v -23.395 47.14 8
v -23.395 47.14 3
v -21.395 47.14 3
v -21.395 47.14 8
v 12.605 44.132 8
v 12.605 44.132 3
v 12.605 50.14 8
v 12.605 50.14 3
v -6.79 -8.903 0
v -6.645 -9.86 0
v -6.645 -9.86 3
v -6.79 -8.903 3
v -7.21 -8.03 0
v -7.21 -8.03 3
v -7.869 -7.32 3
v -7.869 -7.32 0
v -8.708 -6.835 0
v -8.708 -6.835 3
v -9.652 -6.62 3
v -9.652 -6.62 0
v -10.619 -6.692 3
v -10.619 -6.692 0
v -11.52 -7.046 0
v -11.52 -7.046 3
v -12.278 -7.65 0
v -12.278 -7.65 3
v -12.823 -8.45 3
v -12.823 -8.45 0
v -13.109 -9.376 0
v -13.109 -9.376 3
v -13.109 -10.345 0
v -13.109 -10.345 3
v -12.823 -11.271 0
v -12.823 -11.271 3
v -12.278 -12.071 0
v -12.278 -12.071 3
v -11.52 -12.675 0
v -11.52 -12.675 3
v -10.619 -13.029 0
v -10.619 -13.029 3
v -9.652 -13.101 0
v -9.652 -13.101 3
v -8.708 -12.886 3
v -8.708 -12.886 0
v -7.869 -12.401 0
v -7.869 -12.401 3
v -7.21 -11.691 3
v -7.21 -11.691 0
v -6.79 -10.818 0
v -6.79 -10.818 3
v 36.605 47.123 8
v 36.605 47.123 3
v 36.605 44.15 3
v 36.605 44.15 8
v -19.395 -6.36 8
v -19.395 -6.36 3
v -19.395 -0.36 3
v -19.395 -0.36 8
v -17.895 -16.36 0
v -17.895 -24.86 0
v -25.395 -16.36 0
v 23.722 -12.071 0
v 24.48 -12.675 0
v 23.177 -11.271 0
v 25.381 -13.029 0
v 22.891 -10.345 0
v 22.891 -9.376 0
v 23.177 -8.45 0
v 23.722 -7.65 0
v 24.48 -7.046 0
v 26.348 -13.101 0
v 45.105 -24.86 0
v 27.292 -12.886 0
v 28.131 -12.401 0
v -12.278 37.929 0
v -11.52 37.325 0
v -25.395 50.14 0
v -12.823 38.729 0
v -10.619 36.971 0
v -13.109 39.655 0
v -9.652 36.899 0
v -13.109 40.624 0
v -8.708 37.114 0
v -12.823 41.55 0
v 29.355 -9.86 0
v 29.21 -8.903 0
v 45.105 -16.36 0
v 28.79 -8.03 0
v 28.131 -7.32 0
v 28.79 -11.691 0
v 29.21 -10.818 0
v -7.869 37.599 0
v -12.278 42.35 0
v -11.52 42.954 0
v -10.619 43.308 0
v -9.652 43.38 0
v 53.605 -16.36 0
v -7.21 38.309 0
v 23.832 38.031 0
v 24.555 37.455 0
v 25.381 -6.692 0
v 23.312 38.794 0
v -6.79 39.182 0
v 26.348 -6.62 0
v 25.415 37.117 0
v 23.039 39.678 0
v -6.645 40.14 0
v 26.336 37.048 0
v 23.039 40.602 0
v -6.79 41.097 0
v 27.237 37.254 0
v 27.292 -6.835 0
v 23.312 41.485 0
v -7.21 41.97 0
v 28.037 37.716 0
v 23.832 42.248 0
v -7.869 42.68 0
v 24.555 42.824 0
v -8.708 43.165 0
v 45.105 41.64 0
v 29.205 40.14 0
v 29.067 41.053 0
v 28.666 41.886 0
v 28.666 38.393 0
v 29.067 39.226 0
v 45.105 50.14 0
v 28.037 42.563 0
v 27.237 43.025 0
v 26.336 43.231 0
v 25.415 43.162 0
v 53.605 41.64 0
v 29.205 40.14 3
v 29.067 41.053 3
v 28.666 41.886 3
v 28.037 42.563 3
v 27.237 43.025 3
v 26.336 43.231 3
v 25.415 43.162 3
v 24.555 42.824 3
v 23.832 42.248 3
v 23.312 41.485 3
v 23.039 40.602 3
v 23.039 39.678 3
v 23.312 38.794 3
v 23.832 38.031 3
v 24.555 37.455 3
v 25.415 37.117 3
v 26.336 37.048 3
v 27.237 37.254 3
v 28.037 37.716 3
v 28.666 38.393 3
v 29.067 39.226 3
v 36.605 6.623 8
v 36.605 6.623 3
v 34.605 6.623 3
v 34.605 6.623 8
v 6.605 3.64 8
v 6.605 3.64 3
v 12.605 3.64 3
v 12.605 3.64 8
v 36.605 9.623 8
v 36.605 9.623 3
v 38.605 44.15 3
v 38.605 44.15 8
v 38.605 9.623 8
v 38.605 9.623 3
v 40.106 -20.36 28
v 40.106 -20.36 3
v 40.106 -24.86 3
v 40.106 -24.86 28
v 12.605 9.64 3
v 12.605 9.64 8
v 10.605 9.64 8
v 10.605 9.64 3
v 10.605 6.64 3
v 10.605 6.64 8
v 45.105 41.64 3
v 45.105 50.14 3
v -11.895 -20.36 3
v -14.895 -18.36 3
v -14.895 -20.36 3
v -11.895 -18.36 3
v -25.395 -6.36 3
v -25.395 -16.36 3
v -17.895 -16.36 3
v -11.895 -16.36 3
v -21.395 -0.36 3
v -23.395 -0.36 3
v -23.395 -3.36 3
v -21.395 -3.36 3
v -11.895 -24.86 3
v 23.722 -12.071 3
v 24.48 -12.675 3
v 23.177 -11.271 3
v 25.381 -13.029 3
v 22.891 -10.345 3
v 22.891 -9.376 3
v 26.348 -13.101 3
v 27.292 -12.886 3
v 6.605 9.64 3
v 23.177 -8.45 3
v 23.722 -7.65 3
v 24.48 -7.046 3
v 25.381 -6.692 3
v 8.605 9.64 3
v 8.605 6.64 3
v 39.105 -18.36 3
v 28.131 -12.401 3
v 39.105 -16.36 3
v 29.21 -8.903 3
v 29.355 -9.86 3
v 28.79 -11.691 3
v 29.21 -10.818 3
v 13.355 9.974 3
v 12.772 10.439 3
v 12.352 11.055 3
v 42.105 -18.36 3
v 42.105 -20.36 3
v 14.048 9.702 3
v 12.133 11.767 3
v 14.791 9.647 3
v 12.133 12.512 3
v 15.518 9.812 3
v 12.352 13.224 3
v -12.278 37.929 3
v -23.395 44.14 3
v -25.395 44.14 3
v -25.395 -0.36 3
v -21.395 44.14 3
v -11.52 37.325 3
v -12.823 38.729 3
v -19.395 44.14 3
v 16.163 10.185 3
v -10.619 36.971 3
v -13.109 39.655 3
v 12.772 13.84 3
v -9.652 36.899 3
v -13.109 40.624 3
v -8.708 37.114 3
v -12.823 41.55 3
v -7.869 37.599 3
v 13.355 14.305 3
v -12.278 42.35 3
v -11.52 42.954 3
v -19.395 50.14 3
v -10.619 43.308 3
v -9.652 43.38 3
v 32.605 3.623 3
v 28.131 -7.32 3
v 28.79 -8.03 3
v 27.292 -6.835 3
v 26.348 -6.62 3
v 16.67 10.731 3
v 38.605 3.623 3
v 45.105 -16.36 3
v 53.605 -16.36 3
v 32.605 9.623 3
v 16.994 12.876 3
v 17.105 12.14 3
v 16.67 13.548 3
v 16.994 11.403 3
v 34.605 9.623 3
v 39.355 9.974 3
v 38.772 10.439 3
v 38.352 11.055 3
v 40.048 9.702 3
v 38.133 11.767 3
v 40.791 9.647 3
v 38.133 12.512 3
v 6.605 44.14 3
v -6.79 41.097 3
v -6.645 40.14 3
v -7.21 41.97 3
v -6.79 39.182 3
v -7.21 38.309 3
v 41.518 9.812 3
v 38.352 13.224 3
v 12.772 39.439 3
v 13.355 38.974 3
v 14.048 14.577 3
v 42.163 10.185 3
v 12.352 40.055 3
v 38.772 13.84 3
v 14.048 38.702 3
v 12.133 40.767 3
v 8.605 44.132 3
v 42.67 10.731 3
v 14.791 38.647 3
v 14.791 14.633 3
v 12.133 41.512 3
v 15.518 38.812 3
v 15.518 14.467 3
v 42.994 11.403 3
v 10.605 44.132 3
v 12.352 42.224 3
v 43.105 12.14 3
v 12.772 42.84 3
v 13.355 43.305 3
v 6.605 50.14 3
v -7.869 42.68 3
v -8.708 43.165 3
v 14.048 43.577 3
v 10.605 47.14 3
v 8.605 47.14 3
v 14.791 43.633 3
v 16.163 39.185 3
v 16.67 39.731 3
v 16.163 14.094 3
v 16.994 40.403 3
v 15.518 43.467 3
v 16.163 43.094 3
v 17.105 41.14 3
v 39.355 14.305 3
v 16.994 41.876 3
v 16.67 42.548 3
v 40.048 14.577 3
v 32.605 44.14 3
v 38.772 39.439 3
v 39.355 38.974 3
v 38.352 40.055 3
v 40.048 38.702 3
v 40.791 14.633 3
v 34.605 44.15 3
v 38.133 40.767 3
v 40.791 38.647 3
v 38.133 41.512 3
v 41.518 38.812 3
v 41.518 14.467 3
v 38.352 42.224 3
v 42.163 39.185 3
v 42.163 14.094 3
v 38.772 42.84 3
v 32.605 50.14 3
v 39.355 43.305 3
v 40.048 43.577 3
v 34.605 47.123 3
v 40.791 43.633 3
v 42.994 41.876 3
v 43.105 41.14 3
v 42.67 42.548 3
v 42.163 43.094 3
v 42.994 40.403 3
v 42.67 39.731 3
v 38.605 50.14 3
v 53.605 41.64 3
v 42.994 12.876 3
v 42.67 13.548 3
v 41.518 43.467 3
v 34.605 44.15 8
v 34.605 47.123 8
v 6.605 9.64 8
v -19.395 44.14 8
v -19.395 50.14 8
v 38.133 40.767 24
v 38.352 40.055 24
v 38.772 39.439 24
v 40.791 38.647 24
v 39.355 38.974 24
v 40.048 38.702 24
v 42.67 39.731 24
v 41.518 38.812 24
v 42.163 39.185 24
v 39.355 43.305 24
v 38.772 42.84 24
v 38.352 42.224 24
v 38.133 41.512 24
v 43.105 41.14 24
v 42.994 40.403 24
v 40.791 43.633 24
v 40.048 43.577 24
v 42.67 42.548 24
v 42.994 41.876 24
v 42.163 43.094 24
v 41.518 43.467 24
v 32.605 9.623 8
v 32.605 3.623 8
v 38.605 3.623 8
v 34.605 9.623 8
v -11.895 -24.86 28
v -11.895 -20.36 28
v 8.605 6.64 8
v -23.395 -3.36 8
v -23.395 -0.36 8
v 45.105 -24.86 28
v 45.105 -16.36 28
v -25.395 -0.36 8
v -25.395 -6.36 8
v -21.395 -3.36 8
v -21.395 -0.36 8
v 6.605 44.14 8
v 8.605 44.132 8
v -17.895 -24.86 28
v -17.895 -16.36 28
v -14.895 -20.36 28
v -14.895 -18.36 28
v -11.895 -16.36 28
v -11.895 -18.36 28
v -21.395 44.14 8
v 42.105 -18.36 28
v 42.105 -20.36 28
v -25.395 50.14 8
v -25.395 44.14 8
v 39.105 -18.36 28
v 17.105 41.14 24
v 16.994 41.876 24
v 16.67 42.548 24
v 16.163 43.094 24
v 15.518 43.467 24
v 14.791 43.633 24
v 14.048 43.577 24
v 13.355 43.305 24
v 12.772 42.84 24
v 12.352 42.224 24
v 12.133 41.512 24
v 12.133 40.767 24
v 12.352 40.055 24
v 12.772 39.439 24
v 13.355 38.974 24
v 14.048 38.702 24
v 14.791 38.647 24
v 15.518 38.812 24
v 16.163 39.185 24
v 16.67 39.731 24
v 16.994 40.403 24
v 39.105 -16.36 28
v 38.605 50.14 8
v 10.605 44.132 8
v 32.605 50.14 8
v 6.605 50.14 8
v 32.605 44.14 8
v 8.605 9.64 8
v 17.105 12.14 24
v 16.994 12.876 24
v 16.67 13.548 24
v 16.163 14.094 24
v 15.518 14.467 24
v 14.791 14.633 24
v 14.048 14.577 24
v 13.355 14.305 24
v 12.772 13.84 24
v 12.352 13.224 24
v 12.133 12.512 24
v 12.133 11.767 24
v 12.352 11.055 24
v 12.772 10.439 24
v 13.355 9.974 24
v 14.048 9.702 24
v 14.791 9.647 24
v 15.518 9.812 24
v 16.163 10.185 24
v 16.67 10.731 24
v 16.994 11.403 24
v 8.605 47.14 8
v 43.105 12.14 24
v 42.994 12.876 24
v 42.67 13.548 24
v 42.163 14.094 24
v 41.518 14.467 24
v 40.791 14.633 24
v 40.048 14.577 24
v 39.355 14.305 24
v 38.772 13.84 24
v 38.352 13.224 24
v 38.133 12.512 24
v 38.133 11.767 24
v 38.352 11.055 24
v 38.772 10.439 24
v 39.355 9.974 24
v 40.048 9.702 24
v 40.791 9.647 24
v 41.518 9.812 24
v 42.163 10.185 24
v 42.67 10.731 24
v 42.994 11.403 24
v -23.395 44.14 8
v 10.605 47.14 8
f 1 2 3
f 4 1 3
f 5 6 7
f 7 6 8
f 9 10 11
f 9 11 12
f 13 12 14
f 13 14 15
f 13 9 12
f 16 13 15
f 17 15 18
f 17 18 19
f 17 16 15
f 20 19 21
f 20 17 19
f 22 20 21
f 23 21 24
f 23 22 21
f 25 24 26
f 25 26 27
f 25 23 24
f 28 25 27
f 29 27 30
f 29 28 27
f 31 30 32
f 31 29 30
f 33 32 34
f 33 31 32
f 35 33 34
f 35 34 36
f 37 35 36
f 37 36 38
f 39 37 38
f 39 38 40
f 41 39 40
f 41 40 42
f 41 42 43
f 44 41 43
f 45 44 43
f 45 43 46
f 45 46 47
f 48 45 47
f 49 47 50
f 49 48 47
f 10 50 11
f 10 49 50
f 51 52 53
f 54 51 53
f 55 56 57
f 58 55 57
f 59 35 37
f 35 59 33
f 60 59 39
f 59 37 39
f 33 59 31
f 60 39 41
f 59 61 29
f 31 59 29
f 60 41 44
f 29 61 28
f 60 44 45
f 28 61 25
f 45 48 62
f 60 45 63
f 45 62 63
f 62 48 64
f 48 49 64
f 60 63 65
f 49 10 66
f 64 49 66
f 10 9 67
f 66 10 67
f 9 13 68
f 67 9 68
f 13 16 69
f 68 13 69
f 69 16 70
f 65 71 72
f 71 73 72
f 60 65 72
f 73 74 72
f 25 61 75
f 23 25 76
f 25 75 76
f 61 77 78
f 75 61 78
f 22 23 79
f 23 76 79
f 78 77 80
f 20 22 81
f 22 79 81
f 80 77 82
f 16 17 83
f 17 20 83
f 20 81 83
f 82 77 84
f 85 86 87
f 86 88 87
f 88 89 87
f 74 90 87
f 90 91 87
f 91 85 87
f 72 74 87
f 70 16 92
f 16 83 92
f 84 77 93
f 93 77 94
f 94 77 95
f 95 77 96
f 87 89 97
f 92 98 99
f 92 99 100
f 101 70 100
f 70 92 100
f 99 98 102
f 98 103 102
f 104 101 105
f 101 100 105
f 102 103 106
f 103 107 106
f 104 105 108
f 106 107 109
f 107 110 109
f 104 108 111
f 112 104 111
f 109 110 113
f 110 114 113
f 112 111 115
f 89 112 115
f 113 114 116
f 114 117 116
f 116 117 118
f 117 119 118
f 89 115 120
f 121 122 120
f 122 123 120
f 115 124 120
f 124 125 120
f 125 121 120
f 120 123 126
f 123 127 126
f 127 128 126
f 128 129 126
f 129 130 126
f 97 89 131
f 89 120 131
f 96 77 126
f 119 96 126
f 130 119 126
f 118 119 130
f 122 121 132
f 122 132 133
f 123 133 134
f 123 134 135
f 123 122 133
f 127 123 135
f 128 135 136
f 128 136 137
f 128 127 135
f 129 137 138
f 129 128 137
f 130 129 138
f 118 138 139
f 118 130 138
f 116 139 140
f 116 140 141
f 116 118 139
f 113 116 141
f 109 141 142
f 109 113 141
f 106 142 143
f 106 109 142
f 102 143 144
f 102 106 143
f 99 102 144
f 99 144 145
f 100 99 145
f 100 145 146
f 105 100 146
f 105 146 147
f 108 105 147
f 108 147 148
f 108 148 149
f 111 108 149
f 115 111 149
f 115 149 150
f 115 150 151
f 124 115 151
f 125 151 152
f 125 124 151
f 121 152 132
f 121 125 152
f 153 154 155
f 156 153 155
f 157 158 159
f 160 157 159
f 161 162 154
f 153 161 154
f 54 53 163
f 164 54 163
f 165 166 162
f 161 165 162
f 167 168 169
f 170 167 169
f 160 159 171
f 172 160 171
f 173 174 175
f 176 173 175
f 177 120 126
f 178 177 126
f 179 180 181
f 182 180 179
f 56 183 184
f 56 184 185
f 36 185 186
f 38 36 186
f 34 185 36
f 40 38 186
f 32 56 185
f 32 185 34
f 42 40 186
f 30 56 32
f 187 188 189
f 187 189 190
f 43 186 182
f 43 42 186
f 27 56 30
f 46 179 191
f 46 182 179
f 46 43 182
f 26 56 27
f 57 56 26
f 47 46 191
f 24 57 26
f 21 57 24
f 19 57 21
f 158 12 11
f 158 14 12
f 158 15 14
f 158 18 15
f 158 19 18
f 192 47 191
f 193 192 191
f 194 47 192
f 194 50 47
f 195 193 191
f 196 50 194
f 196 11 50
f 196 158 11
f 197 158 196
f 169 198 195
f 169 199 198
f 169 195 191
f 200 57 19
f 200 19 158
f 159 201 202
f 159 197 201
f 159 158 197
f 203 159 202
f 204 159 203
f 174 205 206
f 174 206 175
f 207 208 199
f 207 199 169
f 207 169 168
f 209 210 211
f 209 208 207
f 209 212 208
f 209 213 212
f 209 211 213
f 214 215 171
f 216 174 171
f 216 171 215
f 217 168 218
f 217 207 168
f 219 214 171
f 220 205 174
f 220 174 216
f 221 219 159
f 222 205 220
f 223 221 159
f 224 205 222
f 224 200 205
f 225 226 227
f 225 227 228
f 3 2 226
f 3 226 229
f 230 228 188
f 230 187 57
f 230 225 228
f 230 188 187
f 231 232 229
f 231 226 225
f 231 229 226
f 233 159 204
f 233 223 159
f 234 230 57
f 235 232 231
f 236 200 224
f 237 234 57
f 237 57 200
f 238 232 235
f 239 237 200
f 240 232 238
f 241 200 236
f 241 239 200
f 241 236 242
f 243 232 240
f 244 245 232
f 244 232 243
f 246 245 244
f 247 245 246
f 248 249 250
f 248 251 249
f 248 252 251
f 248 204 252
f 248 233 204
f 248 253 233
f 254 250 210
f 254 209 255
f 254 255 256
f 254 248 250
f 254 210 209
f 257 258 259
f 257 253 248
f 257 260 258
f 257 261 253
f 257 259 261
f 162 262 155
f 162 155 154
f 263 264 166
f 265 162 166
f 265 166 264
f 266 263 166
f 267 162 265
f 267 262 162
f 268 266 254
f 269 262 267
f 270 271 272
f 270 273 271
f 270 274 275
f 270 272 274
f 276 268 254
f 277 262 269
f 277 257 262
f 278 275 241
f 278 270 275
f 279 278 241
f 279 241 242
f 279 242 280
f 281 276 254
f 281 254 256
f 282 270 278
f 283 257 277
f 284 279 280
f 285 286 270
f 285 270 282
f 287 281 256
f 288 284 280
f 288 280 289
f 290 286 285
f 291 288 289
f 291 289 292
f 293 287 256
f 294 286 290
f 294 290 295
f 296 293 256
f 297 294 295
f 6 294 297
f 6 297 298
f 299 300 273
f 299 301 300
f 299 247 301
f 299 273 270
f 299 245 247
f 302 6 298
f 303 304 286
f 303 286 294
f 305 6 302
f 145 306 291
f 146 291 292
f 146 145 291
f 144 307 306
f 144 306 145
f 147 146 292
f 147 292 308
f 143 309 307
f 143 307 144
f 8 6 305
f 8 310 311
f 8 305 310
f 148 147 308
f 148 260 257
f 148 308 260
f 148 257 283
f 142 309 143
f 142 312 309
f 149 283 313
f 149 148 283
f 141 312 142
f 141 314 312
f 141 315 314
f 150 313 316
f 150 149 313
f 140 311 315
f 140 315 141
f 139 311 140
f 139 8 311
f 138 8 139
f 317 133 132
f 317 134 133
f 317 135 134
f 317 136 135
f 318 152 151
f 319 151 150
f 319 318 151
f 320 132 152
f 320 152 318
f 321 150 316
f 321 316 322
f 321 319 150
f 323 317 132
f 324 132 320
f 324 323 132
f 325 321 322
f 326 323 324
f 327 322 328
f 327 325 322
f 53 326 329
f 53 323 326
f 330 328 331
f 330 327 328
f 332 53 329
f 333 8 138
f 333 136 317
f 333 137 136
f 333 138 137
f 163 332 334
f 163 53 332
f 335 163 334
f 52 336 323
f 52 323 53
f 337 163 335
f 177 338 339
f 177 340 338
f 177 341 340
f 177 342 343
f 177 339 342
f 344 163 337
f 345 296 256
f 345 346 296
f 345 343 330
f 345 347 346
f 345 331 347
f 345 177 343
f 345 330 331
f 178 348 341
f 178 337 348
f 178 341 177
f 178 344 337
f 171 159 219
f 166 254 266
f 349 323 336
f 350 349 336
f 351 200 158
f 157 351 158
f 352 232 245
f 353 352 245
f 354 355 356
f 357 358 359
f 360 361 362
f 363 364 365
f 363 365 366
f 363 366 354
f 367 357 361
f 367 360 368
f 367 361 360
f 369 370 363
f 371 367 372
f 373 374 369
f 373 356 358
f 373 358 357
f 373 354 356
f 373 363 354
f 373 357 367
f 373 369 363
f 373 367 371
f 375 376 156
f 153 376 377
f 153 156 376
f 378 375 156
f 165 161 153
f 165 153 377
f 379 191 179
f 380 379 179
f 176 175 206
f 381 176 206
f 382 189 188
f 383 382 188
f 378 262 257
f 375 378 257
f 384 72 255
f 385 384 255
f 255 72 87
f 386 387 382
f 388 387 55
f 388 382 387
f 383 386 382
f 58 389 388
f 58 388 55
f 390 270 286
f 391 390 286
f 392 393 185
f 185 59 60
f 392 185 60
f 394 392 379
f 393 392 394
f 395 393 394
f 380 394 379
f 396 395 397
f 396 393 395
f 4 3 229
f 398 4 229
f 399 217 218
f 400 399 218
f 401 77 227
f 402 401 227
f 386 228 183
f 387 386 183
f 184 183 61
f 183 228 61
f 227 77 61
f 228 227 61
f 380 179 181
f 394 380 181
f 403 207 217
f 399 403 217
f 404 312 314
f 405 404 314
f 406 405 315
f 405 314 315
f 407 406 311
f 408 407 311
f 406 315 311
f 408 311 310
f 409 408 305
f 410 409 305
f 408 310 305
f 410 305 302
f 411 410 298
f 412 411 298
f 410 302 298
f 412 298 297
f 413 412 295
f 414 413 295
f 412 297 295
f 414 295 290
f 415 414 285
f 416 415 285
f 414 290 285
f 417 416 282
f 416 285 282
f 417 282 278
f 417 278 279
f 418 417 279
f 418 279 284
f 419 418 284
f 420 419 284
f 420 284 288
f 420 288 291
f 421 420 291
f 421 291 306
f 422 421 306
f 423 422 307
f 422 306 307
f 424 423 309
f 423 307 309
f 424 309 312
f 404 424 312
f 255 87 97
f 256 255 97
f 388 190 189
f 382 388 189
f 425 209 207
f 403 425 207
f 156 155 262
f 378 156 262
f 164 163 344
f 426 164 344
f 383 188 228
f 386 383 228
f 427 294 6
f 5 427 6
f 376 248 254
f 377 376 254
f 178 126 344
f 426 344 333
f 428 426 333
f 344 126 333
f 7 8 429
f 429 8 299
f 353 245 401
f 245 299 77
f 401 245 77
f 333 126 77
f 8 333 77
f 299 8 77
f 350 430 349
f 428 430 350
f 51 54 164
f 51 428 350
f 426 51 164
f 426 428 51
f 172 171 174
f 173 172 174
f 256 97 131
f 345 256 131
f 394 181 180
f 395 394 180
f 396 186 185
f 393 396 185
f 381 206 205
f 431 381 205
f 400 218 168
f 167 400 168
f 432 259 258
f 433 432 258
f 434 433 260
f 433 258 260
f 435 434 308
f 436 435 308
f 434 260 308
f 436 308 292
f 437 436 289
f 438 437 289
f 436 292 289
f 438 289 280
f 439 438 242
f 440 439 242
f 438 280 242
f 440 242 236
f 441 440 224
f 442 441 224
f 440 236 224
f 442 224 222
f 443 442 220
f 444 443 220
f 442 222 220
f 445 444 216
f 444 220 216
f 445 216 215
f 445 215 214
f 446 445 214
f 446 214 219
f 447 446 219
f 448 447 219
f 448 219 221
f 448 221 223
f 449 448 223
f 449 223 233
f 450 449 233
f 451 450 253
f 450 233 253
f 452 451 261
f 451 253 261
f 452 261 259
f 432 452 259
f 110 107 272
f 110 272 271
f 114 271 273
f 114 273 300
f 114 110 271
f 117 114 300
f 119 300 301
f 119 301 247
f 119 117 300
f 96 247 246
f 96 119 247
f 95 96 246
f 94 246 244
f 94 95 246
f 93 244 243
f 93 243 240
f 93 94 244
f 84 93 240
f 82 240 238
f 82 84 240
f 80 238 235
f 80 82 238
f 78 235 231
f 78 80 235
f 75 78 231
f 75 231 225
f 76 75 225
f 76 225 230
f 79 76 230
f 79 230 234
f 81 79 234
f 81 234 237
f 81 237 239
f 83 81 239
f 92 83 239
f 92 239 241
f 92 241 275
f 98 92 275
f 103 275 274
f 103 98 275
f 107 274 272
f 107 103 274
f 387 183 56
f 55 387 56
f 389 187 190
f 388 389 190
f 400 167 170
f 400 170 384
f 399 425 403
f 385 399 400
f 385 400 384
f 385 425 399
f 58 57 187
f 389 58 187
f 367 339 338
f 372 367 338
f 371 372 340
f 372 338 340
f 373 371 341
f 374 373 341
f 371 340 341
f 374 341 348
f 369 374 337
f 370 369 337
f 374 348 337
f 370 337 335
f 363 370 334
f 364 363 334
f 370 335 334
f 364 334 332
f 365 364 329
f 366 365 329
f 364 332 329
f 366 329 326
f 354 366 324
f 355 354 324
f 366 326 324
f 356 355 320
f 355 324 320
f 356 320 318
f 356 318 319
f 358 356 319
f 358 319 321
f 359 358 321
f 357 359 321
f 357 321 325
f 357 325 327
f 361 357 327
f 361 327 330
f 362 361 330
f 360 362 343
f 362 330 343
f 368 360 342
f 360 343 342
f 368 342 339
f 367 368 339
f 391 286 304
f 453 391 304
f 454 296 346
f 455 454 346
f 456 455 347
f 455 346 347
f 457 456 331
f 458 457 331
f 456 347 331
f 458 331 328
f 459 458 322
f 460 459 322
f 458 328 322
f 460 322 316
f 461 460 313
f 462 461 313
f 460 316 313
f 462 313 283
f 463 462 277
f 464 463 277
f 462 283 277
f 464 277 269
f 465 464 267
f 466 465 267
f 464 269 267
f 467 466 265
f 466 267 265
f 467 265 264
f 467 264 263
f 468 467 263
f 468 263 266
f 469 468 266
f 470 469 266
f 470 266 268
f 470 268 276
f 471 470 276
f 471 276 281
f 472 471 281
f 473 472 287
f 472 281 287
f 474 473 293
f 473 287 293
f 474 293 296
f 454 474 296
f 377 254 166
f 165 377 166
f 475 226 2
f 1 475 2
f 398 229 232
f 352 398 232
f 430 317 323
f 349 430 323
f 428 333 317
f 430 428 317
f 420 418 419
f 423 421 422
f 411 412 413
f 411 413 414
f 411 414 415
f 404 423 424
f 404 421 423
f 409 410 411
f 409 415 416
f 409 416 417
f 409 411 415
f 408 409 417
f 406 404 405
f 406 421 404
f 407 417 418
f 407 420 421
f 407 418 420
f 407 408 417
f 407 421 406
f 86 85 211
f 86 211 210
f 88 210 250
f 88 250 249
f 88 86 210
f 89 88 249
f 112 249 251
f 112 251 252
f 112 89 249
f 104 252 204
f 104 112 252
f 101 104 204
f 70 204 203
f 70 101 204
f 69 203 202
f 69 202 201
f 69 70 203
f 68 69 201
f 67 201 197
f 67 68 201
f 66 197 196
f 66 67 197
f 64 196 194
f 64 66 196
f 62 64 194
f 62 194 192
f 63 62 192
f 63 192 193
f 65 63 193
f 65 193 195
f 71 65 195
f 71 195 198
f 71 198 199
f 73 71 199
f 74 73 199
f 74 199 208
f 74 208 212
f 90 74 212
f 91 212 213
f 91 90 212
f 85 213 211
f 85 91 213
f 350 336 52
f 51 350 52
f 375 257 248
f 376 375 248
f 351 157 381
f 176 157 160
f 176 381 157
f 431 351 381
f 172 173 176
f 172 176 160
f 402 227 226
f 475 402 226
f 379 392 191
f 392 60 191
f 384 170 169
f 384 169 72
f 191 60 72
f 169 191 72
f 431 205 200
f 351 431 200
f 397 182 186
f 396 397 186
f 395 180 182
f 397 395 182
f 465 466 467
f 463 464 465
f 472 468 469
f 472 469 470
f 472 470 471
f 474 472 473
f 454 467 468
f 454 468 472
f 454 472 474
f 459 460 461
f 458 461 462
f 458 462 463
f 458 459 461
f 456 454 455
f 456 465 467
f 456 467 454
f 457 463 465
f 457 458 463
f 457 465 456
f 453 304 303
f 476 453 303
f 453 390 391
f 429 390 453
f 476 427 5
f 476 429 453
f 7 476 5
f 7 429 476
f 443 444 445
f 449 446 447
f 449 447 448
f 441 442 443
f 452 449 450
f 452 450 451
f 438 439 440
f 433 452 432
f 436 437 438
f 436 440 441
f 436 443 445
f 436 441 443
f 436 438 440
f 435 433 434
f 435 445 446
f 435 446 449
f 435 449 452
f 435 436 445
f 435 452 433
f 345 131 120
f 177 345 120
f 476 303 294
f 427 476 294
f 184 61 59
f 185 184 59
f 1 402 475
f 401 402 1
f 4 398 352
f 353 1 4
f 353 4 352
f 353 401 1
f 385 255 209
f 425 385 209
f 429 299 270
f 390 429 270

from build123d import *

# Parameters (mm, degrees)
F0_R     = 3.25
F0_R_2   = 3.1
F1_DEPTH = 3
F3_DEPTH = 5
F4_DEPTH = 25
F2_R     = 2.5
F5_DEPTH = 21


with BuildPart() as f1:
    # F0 (on Top) → F1 (new body)
    with BuildSketch(Plane.XY):
        Polygon((45.104649, 50.139535), (0, 50.139535), (-25.395351, 50.139535), (-25.395351, -16.360465), (-17.895351, -16.360465), (-17.895351, -24.860465), (0, -24.860465), (45.104649, -24.860465), (45.104649, -16.360465), (53.604649, -16.360465), (53.604649, 41.639535), (45.104649, 41.639535), align=None)
        with Locations((-9.895351, -9.860465)):
            Circle(F0_R, mode=Mode.SUBTRACT)
        with Locations((26.104649, -9.860465)):
            Circle(F0_R, mode=Mode.SUBTRACT)
        with Locations((-9.895351, 40.139535)):
            Circle(F0_R, mode=Mode.SUBTRACT)
        with Locations((26.104649, 40.139535)):
            Circle(F0_R_2, mode=Mode.SUBTRACT)
    extrude(amount=F1_DEPTH)

    # F2 (on face) → F3 (join)
    with BuildSketch(Plane.XY.offset(3)):
        Polygon((-23.395351, 44.139535), (-23.395351, 47.139535), (-21.395351, 47.139535), (-21.395351, 44.139535), (-19.395351, 44.139535), (-19.395351, 50.139535), (-25.395351, 50.139535), (-25.395351, 44.139535), align=None)
        Polygon((12.604649, 50.139535), (6.604663, 50.139535), (6.604663, 44.139535), (8.604649, 44.13226), (8.604649, 47.139535), (10.604649, 47.139535), (10.604649, 44.13226), (12.604649, 44.13226), align=None)
        Polygon((8.604649, 6.639535), (8.604649, 9.639535), (6.604649, 9.639535), (6.604649, 3.639535), (12.604649, 3.639535), (12.604649, 9.639535), (10.604649, 9.639535), (10.604649, 6.639535), align=None)
        Polygon((34.604649, 6.622626), (34.604649, 9.622626), (32.604649, 9.622626), (32.604649, 3.622626), (38.604649, 3.622626), (38.604649, 9.622626), (36.604649, 9.622626), (36.604649, 6.622626), align=None)
        Polygon((-23.395351, -3.360465), (-23.395351, -0.360465), (-25.395351, -0.360465), (-25.395351, -6.360465), (-19.395351, -6.360465), (-19.395351, -0.360465), (-21.395351, -0.360465), (-21.395351, -3.360465), align=None)
        Polygon((38.604649, 50.139535), (32.604676, 50.139535), (32.604676, 44.139535), (34.604649, 44.149872), (34.604649, 47.122626), (36.604649, 47.122626), (36.604649, 44.149872), (38.604649, 44.149872), align=None)
    extrude(amount=F3_DEPTH)

    # F2 (on face) → F4 (join)
    with BuildSketch(Plane.XY.offset(3)):
        Polygon((-11.895351, -16.360465), (-17.895351, -16.360465), (-17.895351, -24.860465), (-11.895351, -24.860465), (-11.895351, -20.360465), (-14.895351, -20.360465), (-14.895351, -18.360465), (-11.895351, -18.360465), align=None)
        Polygon((40.105954, -20.360465), (40.105954, -24.860465), (45.104649, -24.860465), (45.104649, -16.360465), (39.104649, -16.360465), (39.104649, -18.360465), (42.104649, -18.360465), (42.104649, -20.360465), align=None)
    extrude(amount=F4_DEPTH)

    # F2 (on face) → F5 (join)
    with BuildSketch(Plane.XY.offset(3)):
        with Locations((14.604649, 41.139535)):
            Circle(F2_R)
        with Locations((14.604649, 12.139535)):
            Circle(F2_R)
        with Locations((40.604649, 12.139535)):
            Circle(F2_R)
        with Locations((40.604649, 41.139535)):
            Circle(F2_R)
    extrude(amount=F5_DEPTH)


solid = f1.part
